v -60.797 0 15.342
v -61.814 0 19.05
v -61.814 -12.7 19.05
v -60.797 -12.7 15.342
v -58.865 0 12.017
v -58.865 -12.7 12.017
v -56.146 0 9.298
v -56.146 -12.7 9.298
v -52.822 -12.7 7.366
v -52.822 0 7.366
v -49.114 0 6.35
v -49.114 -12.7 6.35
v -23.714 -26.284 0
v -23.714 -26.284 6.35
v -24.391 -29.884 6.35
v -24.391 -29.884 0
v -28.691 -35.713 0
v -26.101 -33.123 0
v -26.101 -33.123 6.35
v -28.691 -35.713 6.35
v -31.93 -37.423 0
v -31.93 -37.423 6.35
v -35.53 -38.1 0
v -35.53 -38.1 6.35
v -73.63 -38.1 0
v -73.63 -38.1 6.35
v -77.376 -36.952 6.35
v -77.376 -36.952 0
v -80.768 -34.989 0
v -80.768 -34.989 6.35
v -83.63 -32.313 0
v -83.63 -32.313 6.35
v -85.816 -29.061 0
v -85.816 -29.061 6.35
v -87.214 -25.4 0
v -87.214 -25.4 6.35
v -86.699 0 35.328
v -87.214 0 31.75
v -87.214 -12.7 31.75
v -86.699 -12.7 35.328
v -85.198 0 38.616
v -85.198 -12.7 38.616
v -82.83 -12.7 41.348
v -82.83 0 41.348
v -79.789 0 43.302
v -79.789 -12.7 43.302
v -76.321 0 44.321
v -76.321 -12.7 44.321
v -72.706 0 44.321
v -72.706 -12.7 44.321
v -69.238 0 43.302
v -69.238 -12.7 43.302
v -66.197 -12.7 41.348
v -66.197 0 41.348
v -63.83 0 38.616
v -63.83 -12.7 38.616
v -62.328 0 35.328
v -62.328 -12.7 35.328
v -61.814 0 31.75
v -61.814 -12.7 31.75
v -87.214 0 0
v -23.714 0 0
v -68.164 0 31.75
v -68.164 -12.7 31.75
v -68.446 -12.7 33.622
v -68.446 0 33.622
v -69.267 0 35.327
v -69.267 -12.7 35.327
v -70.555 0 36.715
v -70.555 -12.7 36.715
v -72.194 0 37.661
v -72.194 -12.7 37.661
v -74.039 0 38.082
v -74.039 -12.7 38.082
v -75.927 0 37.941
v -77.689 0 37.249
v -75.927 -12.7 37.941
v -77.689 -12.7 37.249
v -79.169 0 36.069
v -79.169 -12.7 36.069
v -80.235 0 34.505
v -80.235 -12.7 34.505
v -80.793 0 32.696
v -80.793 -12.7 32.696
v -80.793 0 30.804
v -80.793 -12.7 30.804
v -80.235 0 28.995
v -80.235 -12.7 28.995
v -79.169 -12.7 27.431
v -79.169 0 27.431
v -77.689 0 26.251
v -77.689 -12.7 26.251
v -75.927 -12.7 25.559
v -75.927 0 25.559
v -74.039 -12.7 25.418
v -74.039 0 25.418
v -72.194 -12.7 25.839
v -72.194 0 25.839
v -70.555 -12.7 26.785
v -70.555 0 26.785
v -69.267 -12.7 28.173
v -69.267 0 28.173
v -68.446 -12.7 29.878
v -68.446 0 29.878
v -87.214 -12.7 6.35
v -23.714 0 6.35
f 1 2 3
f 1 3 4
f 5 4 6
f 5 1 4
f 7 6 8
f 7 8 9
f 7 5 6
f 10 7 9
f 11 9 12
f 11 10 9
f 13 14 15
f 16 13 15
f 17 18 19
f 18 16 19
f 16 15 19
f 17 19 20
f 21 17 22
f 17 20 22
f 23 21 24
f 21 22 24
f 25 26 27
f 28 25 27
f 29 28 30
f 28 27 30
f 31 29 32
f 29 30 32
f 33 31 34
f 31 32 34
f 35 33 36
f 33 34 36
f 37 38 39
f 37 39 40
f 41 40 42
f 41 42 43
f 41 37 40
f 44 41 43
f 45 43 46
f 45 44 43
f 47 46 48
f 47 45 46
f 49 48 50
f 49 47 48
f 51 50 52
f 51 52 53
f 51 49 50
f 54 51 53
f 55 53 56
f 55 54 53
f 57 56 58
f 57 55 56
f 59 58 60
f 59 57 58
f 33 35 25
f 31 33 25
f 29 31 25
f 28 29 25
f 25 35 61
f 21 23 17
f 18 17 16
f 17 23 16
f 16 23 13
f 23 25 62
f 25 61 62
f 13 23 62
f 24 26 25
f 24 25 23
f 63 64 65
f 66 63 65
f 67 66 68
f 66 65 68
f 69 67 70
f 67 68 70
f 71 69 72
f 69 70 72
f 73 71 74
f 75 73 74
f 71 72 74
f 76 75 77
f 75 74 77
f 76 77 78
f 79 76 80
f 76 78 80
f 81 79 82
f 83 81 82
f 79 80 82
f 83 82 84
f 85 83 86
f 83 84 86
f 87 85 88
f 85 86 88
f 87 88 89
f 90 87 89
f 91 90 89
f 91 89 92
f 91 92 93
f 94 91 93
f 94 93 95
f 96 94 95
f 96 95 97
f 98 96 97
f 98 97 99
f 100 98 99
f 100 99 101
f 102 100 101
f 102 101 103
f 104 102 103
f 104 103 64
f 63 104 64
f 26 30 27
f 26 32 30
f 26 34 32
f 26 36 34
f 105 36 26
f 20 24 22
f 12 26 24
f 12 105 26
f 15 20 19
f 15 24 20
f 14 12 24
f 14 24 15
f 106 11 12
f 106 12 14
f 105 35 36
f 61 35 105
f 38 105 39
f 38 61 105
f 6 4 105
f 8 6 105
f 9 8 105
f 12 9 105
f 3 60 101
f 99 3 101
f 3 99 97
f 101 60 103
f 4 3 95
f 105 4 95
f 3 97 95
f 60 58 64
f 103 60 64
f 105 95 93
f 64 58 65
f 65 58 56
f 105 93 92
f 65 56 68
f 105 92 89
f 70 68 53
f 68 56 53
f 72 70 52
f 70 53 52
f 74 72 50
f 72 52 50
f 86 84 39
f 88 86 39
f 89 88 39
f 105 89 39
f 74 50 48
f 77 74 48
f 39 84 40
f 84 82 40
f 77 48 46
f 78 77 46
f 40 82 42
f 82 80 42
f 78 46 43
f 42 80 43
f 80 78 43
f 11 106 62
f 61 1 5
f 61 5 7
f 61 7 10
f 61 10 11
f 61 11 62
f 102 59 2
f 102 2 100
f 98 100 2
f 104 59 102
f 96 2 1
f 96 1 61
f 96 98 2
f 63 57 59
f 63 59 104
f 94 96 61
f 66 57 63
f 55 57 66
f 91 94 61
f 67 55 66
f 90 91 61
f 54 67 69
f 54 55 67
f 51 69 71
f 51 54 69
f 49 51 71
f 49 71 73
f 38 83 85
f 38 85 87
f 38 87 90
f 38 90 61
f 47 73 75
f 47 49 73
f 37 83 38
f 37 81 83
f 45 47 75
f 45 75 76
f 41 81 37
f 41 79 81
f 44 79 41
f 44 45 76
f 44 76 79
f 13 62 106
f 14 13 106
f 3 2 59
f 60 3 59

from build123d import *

# Parameters (mm, degrees)
F0_W      = 63.5
F0_H      = 6.35
F1_DEPTH  = 38.1
F3_DEPTH  = 25.4
F5_DEPTH  = 25.4
F6_W      = 25.4
F6_H      = 25.4
F7_DEPTH  = 12.7
F9_DEPTH  = 12.7
F11_DEPTH = 12.7
F12_R     = 6.35
F13_DEPTH = 25.4


with BuildPart() as f1:
    # F0 (on Front) → F1 (new body)
    with BuildSketch(Plane.XZ):
        with Locations((-55.4636918637, 3.175)):
            Rectangle(F0_W, F0_H)
    extrude(amount=F1_DEPTH)

    # F2 (on face) → F3 (cut)
    with BuildSketch(Plane.XY.offset(6.35)):
        with BuildLine():
            ThreePointArc((-23.7136918637, -26.2837559164), (-27.2983828623, -34.5153090014), (-35.5299359473, -38.1))
            Line((-35.5299359473, -38.1), (-23.7136918637, -38.1))
            Line((-23.7136918637, -38.1), (-23.7136918637, -26.2837559164))
        make_face()
    extrude(amount=-F3_DEPTH, mode=Mode.SUBTRACT)

    # F4 (on face) → F5 (cut)
    with BuildSketch(Plane.XY.offset(6.35)):
        with BuildLine():
            ThreePointArc((-73.6299359473, -38.1), (-82.2750994664, -33.7322502916), (-87.2136918637, -25.4))
            Line((-87.2136918637, -25.4), (-87.2136918637, -38.1))
            Line((-87.2136918637, -38.1), (-73.6299359473, -38.1))
        make_face()
    extrude(amount=-F5_DEPTH, mode=Mode.SUBTRACT)

    # F6 (on face) → F7 (join)
    with BuildSketch(Plane(origin=(0, 0, 0), x_dir=(-1, 0, 0), z_dir=(0, 1, 0))):
        with Locations((74.5136918637, 19.05)):
            Rectangle(F6_W, F6_H)
    extrude(amount=-F7_DEPTH)

    # F8 (on face) → F9 (join)
    with BuildSketch(Plane(origin=(0, 0, 0), x_dir=(-1, 0, 0), z_dir=(0, 1, 0))):
        with BuildLine():
            ThreePointArc((61.8136918637, 19.05), (57.5939587617, 10.569733102), (49.1136918637, 6.35))
            Line((49.1136918637, 6.35), (61.8136918637, 6.35))
            Line((61.8136918637, 6.35), (61.8136918637, 19.05))
        make_face()
    extrude(amount=-F9_DEPTH)

    # F10 (on face) → F11 (join)
    with BuildSketch(Plane(origin=(0, 0, 0), x_dir=(-1, 0, 0), z_dir=(0, 1, 0))):
        with BuildLine():
            Line((61.8136918637, 31.75), (87.2136918637, 31.75))
            ThreePointArc((87.2136918637, 31.75), (74.5136918637, 44.45), (61.8136918637, 31.75))
        make_face()
    extrude(amount=-F11_DEPTH)

    # F12 (on face) → F13 (cut)
    with BuildSketch(Plane.XZ.offset(12.7)):
        with Locations((-74.5136918637, 31.75)):
            Circle(F12_R)
    extrude(amount=-F13_DEPTH, mode=Mode.SUBTRACT)


solid = f1.part
